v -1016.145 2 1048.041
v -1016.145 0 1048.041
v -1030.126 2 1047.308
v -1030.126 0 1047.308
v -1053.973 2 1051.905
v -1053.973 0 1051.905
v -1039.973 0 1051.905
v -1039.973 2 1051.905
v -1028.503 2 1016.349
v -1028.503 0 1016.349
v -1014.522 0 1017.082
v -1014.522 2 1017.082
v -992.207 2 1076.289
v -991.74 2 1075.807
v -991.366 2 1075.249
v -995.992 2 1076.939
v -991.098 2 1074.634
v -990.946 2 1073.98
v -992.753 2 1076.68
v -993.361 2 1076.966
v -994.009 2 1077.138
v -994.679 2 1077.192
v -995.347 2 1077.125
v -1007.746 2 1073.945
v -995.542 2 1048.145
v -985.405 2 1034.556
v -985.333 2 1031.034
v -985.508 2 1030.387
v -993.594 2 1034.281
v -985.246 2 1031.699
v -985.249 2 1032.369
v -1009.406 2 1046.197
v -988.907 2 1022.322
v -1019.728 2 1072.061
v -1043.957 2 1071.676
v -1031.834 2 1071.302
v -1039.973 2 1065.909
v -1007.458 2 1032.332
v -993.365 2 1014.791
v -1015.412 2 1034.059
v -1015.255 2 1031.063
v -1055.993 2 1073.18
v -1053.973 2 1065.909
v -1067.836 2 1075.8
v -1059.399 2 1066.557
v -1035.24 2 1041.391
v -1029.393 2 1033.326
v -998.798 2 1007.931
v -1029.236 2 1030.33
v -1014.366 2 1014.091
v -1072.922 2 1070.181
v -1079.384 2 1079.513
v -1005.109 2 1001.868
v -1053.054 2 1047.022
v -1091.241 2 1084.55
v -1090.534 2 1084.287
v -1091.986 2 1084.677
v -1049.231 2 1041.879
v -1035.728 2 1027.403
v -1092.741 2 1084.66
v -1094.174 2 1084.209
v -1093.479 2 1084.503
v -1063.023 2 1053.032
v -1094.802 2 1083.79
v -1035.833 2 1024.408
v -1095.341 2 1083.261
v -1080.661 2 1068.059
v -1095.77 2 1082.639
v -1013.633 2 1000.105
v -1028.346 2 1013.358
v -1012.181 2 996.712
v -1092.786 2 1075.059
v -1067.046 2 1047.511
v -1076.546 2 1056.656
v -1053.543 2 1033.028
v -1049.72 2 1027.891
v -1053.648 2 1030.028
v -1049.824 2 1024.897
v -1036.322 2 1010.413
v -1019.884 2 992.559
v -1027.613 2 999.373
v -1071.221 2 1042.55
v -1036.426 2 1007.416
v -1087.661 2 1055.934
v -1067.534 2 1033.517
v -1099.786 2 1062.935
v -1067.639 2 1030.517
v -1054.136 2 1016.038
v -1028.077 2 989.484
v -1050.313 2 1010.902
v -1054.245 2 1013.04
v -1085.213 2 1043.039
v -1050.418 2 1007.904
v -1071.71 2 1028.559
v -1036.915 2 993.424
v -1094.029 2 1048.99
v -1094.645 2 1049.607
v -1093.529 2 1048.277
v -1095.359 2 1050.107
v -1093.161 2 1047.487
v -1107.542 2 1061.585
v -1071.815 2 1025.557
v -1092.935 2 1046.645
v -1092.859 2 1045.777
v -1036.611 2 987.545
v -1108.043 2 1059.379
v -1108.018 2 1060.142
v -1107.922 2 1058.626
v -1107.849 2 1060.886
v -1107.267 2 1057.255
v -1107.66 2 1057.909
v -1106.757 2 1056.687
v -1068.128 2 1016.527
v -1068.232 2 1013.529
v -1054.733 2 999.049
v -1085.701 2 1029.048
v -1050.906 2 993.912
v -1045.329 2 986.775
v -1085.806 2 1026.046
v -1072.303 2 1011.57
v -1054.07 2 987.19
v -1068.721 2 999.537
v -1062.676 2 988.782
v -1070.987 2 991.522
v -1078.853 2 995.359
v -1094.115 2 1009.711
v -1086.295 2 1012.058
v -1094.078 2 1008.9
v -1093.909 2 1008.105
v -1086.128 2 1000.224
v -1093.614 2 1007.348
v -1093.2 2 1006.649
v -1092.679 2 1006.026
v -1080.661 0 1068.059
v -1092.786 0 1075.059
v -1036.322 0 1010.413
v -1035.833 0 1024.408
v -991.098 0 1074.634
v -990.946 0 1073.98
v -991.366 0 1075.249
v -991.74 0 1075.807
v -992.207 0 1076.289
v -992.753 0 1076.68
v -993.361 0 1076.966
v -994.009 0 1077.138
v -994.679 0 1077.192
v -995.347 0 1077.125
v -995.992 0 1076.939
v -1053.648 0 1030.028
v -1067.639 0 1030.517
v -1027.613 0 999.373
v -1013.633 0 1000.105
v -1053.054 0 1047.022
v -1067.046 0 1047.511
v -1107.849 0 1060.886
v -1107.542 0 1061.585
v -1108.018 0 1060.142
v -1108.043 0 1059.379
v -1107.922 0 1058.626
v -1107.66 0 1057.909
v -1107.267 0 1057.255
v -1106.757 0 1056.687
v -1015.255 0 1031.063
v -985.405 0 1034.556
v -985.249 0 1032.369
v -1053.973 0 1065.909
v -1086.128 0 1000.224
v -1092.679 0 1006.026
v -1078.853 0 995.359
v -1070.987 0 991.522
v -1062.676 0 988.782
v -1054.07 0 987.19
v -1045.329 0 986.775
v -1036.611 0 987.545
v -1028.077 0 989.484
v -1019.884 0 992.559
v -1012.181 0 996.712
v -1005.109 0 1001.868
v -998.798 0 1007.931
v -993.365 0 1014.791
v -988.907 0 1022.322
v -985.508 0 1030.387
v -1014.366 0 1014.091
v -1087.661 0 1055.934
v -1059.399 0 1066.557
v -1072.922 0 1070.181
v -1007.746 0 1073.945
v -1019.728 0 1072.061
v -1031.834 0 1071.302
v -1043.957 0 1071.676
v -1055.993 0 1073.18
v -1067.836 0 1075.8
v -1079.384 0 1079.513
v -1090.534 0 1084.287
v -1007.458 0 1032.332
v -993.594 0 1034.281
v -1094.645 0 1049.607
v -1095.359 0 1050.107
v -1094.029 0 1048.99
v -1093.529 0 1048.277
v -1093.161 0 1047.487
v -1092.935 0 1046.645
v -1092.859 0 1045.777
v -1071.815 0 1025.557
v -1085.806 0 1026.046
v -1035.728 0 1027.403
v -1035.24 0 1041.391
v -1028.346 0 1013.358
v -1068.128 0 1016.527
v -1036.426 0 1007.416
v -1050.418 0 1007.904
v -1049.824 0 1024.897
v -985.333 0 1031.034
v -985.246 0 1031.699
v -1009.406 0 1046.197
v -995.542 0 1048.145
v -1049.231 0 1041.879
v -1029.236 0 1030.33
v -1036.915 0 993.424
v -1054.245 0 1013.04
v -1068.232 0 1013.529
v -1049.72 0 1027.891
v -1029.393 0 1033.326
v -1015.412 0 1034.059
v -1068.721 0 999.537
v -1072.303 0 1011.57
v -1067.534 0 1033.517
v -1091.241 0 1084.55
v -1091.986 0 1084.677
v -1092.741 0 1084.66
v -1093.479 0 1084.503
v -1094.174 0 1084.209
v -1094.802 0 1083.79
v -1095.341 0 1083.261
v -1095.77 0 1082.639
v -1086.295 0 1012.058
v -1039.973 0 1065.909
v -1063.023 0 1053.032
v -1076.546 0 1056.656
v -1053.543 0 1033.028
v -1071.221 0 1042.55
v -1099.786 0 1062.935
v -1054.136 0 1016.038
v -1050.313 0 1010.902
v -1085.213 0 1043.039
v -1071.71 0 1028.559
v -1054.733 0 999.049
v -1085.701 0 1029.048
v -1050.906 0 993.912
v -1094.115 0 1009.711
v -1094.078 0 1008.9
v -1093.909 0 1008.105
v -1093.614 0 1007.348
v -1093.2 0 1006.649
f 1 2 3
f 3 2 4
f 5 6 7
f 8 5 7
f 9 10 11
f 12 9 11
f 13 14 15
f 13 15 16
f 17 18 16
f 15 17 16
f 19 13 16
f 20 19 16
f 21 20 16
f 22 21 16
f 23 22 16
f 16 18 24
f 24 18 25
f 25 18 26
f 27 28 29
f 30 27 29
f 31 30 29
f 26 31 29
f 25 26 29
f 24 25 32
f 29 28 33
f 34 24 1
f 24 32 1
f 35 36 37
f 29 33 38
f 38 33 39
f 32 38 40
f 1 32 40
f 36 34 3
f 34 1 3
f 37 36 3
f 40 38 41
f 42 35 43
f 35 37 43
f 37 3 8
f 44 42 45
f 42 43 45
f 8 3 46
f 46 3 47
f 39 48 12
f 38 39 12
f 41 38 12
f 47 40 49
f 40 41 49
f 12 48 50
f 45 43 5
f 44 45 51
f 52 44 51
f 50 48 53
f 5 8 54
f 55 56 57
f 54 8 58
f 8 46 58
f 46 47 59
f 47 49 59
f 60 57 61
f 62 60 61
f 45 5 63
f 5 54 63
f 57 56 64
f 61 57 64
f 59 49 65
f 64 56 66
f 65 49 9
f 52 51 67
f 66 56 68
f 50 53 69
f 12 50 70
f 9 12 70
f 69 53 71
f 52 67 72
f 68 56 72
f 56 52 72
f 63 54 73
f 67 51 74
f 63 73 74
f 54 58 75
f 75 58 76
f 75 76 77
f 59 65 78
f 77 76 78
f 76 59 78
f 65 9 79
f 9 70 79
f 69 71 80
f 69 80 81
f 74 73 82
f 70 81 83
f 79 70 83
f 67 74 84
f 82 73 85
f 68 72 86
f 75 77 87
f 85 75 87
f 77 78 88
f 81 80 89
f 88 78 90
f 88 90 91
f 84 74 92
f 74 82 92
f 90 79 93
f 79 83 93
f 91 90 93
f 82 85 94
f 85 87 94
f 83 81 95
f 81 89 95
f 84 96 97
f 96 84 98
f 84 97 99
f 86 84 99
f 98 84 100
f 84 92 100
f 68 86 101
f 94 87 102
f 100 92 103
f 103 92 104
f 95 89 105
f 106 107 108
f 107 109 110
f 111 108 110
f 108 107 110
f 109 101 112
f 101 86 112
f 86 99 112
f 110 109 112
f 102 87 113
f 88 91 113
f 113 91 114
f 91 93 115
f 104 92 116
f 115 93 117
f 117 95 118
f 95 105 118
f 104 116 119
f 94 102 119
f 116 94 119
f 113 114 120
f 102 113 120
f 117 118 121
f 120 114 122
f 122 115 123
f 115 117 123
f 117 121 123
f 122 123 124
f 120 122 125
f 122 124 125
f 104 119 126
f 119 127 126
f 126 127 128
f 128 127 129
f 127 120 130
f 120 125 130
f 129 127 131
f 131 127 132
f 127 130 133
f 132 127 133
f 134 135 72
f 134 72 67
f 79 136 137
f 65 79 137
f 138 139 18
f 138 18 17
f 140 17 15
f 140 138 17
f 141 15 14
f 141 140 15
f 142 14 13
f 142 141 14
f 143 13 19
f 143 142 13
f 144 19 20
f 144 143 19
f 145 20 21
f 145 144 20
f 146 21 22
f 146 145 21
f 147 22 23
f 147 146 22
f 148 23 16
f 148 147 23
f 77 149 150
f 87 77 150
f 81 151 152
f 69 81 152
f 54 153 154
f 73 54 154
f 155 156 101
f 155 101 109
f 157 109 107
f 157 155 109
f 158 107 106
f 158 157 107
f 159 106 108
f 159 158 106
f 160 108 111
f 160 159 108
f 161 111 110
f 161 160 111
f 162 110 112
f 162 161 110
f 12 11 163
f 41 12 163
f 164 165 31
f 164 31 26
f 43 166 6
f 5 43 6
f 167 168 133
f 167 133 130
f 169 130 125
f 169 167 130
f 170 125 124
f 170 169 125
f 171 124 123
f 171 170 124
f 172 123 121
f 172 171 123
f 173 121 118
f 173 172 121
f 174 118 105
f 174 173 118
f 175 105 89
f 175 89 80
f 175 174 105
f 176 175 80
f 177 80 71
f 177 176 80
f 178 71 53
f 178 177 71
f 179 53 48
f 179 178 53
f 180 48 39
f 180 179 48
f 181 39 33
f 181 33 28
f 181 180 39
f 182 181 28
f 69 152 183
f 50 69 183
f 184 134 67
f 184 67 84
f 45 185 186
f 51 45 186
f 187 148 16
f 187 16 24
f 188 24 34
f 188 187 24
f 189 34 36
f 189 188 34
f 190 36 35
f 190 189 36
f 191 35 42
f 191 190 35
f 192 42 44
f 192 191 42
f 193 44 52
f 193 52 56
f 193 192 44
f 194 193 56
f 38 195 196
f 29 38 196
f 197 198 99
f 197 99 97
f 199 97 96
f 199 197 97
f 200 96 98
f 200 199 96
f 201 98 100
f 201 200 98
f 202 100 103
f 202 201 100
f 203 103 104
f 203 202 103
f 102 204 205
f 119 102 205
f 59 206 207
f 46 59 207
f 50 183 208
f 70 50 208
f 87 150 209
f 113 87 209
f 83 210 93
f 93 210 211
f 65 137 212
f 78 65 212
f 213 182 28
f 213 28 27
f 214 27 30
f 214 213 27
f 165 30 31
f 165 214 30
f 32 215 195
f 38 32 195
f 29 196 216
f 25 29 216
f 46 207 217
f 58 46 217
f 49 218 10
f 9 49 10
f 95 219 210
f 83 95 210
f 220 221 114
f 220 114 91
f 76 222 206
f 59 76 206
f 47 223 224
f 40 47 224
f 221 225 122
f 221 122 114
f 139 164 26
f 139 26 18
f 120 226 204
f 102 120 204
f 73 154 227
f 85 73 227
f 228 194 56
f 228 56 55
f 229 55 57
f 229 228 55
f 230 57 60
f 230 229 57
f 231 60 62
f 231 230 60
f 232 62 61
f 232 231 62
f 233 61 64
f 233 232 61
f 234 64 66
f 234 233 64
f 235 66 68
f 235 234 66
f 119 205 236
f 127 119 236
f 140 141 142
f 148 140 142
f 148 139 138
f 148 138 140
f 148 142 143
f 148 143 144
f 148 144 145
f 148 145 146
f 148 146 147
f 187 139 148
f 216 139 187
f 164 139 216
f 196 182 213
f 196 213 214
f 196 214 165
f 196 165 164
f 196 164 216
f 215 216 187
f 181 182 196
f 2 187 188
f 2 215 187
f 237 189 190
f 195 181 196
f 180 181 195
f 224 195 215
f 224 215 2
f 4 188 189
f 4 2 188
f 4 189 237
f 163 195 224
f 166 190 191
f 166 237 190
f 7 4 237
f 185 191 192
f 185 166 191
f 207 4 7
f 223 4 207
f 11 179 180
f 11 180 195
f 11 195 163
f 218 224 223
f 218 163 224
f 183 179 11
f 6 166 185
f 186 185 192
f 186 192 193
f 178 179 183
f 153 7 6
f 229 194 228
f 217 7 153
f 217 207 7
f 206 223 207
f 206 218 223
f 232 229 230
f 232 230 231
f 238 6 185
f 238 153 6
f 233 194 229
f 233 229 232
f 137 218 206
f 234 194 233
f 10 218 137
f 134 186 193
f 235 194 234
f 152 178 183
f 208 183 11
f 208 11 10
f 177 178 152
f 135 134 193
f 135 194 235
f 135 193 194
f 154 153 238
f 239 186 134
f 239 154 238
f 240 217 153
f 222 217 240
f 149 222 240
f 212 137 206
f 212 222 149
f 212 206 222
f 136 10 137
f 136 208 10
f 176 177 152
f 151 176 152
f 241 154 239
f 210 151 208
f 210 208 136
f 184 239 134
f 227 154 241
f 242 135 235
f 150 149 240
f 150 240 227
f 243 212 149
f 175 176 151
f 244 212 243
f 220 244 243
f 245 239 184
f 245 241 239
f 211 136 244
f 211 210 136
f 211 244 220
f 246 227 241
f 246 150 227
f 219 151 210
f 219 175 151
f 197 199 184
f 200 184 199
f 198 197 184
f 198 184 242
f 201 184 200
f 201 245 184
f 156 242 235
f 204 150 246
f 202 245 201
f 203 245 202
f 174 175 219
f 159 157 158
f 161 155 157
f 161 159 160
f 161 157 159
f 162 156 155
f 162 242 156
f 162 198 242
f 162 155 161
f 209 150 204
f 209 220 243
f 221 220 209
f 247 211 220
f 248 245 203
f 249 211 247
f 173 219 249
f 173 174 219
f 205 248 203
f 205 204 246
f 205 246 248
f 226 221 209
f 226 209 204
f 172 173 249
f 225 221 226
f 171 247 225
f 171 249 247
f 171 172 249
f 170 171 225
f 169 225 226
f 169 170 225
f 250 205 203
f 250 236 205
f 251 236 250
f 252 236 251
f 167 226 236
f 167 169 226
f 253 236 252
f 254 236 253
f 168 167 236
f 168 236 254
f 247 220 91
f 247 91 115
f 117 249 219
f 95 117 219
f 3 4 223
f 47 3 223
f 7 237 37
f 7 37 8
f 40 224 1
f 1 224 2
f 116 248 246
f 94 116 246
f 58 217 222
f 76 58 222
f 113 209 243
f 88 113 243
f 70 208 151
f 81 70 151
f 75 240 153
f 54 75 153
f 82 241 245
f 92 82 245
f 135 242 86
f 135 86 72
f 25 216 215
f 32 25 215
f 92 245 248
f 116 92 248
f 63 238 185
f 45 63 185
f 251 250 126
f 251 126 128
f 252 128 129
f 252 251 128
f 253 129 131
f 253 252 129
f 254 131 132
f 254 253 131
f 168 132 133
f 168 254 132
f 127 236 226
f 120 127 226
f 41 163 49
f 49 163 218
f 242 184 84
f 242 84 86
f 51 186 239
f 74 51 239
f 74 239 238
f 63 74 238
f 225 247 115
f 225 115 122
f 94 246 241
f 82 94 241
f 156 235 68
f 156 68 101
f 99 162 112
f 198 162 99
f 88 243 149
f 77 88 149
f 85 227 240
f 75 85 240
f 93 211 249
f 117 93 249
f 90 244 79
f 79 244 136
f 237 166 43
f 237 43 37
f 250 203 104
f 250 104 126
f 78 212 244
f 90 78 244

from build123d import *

# Parameters (mm, degrees)
SKETCH2_W           = 14
SKETCH2_H           = 14.003492138
BOSS_EXTRUDE1_DEPTH = 2


with BuildPart() as part:
    # Sketch2 → Boss-Extrude1 (new body)
    with BuildSketch(Plane(origin=(0, 0, 0), x_dir=(1, 0, 0), z_dir=(0, 1, 0))):
        with BuildLine():
            Line((-1095.769577908, -1082.63934327), (-1107.541983277, -1061.584764794))
            ThreePointArc((-1107.541983277, -1061.584764794), (-1108.000297721, -1058.999800443), (-1106.757289889, -1056.687437072))
            Line((-1106.757289889, -1056.687437072), (-1095.359092699, -1050.106684856))
            ThreePointArc((-1095.359092699, -1050.106684856), (-1093.52896568, -1048.276557838), (-1092.859092699, -1045.776557838))
            Line((-1092.859092699, -1045.776557838), (-1094.115480669, -1009.711041726))
            ThreePointArc((-1094.115480669, -1009.711041726), (-1093.777019534, -1007.720622139), (-1092.679112618, -1006.026241285))
            ThreePointArc((-1092.679112618, -1006.026241285), (-1032.311467942, -988.369881675), (-985.507730543, -1030.38666075))
            ThreePointArc((-985.507730543, -1030.38666075), (-985.278073332, -1031.364982485), (-985.24860148, -1032.369466065))
            Line((-985.24860148, -1032.369466065), (-985.404903488, -1034.555701493))
            Line((-985.404903488, -1034.555701493), (-990.945620353, -1073.979950898))
            ThreePointArc((-990.945620353, -1073.979950898), (-992.753308552, -1076.67957505), (-995.991887306, -1076.939026078))
            ThreePointArc((-995.991887306, -1076.939026078), (-1043.957441778, -1071.676478665), (-1090.53391343, -1084.286835898))
            ThreePointArc((-1090.53391343, -1084.286835898), (-1093.478902478, -1084.502780598), (-1095.769577908, -1082.63934327))
        make_face()
        Polygon((-1086.294602377, -1012.058273794), (-1072.303130777, -1011.569680794), (-1071.814676576, -1025.557177729), (-1085.806148176, -1026.045770729), align=None, mode=Mode.SUBTRACT)
        Polygon((-1068.720871477, -999.537331894), (-1068.232278477, -1013.528803494), (-1054.244579364, -1013.040342232), (-1054.733172364, -999.048870632), align=None, mode=Mode.SUBTRACT)
        Polygon((-1050.906333977, -993.912186894), (-1036.914862377, -993.423593894), (-1036.426243752, -1007.415799297), (-1050.417715352, -1007.904392297), align=None, mode=Mode.SUBTRACT)
        Polygon((-1027.613440377, -999.372618594), (-1013.632626977, -1000.105321994), (-1014.36558899, -1014.091070024), (-1028.34640239, -1013.358366624), align=None, mode=Mode.SUBTRACT)
        Polygon((-1028.503151677, -1016.349320694), (-1014.522338277, -1017.082024094), (-1015.25503736, -1031.062755126), (-1029.23585076, -1030.330051726), align=None, mode=Mode.SUBTRACT)
        Polygon((-1029.392862977, -1033.326022794), (-1015.412049577, -1034.058726194), (-1016.144804819, -1048.04052879), (-1030.125618219, -1047.30782539), align=None, mode=Mode.SUBTRACT)
        Polygon((-1007.457654877, -1032.332416694), (-993.593901877, -1034.280840094), (-995.542405578, -1048.145164464), (-1009.406158578, -1046.196741064), align=None, mode=Mode.SUBTRACT)
        Polygon((-1050.313042577, -1010.901830994), (-1036.321570977, -1010.413237994), (-1035.832862611, -1024.408013247), (-1049.824334211, -1024.896606247), align=None, mode=Mode.SUBTRACT)
        Polygon((-1068.127580077, -1016.526975994), (-1054.136108477, -1016.038382994), (-1053.647579498, -1030.028021263), (-1067.639051098, -1030.516614263), align=None, mode=Mode.SUBTRACT)
        Polygon((-1067.534288677, -1033.516620094), (-1053.542817077, -1033.028027094), (-1053.054129332, -1047.022211839), (-1067.045600932, -1047.510804839), align=None, mode=Mode.SUBTRACT)
        Polygon((-1085.701310977, -1029.047917894), (-1071.709839377, -1028.559324894), (-1071.22126078, -1042.550384043), (-1085.21273238, -1043.038977043), align=None, mode=Mode.SUBTRACT)
        Polygon((-1049.719751177, -1027.891475094), (-1035.728279577, -1027.402882094), (-1035.239810651, -1041.390800691), (-1049.231282251, -1041.879393691), align=None, mode=Mode.SUBTRACT)
        with Locations((-1046.973178577, -1058.907162363)):
            Rectangle(SKETCH2_W, SKETCH2_H, mode=Mode.SUBTRACT)
        Polygon((-1076.546392677, -1056.655668794), (-1063.023431077, -1053.032202194), (-1059.399339813, -1066.557495071), (-1072.922301413, -1070.180961671), align=None, mode=Mode.SUBTRACT)
        Polygon((-1099.786325567, -1062.934815358), (-1092.78632559, -1075.059170971), (-1080.661053874, -1068.058642082), (-1087.661053851, -1055.934286468), align=None, mode=Mode.SUBTRACT)
    extrude(amount=BOSS_EXTRUDE1_DEPTH)


solid = part.part
